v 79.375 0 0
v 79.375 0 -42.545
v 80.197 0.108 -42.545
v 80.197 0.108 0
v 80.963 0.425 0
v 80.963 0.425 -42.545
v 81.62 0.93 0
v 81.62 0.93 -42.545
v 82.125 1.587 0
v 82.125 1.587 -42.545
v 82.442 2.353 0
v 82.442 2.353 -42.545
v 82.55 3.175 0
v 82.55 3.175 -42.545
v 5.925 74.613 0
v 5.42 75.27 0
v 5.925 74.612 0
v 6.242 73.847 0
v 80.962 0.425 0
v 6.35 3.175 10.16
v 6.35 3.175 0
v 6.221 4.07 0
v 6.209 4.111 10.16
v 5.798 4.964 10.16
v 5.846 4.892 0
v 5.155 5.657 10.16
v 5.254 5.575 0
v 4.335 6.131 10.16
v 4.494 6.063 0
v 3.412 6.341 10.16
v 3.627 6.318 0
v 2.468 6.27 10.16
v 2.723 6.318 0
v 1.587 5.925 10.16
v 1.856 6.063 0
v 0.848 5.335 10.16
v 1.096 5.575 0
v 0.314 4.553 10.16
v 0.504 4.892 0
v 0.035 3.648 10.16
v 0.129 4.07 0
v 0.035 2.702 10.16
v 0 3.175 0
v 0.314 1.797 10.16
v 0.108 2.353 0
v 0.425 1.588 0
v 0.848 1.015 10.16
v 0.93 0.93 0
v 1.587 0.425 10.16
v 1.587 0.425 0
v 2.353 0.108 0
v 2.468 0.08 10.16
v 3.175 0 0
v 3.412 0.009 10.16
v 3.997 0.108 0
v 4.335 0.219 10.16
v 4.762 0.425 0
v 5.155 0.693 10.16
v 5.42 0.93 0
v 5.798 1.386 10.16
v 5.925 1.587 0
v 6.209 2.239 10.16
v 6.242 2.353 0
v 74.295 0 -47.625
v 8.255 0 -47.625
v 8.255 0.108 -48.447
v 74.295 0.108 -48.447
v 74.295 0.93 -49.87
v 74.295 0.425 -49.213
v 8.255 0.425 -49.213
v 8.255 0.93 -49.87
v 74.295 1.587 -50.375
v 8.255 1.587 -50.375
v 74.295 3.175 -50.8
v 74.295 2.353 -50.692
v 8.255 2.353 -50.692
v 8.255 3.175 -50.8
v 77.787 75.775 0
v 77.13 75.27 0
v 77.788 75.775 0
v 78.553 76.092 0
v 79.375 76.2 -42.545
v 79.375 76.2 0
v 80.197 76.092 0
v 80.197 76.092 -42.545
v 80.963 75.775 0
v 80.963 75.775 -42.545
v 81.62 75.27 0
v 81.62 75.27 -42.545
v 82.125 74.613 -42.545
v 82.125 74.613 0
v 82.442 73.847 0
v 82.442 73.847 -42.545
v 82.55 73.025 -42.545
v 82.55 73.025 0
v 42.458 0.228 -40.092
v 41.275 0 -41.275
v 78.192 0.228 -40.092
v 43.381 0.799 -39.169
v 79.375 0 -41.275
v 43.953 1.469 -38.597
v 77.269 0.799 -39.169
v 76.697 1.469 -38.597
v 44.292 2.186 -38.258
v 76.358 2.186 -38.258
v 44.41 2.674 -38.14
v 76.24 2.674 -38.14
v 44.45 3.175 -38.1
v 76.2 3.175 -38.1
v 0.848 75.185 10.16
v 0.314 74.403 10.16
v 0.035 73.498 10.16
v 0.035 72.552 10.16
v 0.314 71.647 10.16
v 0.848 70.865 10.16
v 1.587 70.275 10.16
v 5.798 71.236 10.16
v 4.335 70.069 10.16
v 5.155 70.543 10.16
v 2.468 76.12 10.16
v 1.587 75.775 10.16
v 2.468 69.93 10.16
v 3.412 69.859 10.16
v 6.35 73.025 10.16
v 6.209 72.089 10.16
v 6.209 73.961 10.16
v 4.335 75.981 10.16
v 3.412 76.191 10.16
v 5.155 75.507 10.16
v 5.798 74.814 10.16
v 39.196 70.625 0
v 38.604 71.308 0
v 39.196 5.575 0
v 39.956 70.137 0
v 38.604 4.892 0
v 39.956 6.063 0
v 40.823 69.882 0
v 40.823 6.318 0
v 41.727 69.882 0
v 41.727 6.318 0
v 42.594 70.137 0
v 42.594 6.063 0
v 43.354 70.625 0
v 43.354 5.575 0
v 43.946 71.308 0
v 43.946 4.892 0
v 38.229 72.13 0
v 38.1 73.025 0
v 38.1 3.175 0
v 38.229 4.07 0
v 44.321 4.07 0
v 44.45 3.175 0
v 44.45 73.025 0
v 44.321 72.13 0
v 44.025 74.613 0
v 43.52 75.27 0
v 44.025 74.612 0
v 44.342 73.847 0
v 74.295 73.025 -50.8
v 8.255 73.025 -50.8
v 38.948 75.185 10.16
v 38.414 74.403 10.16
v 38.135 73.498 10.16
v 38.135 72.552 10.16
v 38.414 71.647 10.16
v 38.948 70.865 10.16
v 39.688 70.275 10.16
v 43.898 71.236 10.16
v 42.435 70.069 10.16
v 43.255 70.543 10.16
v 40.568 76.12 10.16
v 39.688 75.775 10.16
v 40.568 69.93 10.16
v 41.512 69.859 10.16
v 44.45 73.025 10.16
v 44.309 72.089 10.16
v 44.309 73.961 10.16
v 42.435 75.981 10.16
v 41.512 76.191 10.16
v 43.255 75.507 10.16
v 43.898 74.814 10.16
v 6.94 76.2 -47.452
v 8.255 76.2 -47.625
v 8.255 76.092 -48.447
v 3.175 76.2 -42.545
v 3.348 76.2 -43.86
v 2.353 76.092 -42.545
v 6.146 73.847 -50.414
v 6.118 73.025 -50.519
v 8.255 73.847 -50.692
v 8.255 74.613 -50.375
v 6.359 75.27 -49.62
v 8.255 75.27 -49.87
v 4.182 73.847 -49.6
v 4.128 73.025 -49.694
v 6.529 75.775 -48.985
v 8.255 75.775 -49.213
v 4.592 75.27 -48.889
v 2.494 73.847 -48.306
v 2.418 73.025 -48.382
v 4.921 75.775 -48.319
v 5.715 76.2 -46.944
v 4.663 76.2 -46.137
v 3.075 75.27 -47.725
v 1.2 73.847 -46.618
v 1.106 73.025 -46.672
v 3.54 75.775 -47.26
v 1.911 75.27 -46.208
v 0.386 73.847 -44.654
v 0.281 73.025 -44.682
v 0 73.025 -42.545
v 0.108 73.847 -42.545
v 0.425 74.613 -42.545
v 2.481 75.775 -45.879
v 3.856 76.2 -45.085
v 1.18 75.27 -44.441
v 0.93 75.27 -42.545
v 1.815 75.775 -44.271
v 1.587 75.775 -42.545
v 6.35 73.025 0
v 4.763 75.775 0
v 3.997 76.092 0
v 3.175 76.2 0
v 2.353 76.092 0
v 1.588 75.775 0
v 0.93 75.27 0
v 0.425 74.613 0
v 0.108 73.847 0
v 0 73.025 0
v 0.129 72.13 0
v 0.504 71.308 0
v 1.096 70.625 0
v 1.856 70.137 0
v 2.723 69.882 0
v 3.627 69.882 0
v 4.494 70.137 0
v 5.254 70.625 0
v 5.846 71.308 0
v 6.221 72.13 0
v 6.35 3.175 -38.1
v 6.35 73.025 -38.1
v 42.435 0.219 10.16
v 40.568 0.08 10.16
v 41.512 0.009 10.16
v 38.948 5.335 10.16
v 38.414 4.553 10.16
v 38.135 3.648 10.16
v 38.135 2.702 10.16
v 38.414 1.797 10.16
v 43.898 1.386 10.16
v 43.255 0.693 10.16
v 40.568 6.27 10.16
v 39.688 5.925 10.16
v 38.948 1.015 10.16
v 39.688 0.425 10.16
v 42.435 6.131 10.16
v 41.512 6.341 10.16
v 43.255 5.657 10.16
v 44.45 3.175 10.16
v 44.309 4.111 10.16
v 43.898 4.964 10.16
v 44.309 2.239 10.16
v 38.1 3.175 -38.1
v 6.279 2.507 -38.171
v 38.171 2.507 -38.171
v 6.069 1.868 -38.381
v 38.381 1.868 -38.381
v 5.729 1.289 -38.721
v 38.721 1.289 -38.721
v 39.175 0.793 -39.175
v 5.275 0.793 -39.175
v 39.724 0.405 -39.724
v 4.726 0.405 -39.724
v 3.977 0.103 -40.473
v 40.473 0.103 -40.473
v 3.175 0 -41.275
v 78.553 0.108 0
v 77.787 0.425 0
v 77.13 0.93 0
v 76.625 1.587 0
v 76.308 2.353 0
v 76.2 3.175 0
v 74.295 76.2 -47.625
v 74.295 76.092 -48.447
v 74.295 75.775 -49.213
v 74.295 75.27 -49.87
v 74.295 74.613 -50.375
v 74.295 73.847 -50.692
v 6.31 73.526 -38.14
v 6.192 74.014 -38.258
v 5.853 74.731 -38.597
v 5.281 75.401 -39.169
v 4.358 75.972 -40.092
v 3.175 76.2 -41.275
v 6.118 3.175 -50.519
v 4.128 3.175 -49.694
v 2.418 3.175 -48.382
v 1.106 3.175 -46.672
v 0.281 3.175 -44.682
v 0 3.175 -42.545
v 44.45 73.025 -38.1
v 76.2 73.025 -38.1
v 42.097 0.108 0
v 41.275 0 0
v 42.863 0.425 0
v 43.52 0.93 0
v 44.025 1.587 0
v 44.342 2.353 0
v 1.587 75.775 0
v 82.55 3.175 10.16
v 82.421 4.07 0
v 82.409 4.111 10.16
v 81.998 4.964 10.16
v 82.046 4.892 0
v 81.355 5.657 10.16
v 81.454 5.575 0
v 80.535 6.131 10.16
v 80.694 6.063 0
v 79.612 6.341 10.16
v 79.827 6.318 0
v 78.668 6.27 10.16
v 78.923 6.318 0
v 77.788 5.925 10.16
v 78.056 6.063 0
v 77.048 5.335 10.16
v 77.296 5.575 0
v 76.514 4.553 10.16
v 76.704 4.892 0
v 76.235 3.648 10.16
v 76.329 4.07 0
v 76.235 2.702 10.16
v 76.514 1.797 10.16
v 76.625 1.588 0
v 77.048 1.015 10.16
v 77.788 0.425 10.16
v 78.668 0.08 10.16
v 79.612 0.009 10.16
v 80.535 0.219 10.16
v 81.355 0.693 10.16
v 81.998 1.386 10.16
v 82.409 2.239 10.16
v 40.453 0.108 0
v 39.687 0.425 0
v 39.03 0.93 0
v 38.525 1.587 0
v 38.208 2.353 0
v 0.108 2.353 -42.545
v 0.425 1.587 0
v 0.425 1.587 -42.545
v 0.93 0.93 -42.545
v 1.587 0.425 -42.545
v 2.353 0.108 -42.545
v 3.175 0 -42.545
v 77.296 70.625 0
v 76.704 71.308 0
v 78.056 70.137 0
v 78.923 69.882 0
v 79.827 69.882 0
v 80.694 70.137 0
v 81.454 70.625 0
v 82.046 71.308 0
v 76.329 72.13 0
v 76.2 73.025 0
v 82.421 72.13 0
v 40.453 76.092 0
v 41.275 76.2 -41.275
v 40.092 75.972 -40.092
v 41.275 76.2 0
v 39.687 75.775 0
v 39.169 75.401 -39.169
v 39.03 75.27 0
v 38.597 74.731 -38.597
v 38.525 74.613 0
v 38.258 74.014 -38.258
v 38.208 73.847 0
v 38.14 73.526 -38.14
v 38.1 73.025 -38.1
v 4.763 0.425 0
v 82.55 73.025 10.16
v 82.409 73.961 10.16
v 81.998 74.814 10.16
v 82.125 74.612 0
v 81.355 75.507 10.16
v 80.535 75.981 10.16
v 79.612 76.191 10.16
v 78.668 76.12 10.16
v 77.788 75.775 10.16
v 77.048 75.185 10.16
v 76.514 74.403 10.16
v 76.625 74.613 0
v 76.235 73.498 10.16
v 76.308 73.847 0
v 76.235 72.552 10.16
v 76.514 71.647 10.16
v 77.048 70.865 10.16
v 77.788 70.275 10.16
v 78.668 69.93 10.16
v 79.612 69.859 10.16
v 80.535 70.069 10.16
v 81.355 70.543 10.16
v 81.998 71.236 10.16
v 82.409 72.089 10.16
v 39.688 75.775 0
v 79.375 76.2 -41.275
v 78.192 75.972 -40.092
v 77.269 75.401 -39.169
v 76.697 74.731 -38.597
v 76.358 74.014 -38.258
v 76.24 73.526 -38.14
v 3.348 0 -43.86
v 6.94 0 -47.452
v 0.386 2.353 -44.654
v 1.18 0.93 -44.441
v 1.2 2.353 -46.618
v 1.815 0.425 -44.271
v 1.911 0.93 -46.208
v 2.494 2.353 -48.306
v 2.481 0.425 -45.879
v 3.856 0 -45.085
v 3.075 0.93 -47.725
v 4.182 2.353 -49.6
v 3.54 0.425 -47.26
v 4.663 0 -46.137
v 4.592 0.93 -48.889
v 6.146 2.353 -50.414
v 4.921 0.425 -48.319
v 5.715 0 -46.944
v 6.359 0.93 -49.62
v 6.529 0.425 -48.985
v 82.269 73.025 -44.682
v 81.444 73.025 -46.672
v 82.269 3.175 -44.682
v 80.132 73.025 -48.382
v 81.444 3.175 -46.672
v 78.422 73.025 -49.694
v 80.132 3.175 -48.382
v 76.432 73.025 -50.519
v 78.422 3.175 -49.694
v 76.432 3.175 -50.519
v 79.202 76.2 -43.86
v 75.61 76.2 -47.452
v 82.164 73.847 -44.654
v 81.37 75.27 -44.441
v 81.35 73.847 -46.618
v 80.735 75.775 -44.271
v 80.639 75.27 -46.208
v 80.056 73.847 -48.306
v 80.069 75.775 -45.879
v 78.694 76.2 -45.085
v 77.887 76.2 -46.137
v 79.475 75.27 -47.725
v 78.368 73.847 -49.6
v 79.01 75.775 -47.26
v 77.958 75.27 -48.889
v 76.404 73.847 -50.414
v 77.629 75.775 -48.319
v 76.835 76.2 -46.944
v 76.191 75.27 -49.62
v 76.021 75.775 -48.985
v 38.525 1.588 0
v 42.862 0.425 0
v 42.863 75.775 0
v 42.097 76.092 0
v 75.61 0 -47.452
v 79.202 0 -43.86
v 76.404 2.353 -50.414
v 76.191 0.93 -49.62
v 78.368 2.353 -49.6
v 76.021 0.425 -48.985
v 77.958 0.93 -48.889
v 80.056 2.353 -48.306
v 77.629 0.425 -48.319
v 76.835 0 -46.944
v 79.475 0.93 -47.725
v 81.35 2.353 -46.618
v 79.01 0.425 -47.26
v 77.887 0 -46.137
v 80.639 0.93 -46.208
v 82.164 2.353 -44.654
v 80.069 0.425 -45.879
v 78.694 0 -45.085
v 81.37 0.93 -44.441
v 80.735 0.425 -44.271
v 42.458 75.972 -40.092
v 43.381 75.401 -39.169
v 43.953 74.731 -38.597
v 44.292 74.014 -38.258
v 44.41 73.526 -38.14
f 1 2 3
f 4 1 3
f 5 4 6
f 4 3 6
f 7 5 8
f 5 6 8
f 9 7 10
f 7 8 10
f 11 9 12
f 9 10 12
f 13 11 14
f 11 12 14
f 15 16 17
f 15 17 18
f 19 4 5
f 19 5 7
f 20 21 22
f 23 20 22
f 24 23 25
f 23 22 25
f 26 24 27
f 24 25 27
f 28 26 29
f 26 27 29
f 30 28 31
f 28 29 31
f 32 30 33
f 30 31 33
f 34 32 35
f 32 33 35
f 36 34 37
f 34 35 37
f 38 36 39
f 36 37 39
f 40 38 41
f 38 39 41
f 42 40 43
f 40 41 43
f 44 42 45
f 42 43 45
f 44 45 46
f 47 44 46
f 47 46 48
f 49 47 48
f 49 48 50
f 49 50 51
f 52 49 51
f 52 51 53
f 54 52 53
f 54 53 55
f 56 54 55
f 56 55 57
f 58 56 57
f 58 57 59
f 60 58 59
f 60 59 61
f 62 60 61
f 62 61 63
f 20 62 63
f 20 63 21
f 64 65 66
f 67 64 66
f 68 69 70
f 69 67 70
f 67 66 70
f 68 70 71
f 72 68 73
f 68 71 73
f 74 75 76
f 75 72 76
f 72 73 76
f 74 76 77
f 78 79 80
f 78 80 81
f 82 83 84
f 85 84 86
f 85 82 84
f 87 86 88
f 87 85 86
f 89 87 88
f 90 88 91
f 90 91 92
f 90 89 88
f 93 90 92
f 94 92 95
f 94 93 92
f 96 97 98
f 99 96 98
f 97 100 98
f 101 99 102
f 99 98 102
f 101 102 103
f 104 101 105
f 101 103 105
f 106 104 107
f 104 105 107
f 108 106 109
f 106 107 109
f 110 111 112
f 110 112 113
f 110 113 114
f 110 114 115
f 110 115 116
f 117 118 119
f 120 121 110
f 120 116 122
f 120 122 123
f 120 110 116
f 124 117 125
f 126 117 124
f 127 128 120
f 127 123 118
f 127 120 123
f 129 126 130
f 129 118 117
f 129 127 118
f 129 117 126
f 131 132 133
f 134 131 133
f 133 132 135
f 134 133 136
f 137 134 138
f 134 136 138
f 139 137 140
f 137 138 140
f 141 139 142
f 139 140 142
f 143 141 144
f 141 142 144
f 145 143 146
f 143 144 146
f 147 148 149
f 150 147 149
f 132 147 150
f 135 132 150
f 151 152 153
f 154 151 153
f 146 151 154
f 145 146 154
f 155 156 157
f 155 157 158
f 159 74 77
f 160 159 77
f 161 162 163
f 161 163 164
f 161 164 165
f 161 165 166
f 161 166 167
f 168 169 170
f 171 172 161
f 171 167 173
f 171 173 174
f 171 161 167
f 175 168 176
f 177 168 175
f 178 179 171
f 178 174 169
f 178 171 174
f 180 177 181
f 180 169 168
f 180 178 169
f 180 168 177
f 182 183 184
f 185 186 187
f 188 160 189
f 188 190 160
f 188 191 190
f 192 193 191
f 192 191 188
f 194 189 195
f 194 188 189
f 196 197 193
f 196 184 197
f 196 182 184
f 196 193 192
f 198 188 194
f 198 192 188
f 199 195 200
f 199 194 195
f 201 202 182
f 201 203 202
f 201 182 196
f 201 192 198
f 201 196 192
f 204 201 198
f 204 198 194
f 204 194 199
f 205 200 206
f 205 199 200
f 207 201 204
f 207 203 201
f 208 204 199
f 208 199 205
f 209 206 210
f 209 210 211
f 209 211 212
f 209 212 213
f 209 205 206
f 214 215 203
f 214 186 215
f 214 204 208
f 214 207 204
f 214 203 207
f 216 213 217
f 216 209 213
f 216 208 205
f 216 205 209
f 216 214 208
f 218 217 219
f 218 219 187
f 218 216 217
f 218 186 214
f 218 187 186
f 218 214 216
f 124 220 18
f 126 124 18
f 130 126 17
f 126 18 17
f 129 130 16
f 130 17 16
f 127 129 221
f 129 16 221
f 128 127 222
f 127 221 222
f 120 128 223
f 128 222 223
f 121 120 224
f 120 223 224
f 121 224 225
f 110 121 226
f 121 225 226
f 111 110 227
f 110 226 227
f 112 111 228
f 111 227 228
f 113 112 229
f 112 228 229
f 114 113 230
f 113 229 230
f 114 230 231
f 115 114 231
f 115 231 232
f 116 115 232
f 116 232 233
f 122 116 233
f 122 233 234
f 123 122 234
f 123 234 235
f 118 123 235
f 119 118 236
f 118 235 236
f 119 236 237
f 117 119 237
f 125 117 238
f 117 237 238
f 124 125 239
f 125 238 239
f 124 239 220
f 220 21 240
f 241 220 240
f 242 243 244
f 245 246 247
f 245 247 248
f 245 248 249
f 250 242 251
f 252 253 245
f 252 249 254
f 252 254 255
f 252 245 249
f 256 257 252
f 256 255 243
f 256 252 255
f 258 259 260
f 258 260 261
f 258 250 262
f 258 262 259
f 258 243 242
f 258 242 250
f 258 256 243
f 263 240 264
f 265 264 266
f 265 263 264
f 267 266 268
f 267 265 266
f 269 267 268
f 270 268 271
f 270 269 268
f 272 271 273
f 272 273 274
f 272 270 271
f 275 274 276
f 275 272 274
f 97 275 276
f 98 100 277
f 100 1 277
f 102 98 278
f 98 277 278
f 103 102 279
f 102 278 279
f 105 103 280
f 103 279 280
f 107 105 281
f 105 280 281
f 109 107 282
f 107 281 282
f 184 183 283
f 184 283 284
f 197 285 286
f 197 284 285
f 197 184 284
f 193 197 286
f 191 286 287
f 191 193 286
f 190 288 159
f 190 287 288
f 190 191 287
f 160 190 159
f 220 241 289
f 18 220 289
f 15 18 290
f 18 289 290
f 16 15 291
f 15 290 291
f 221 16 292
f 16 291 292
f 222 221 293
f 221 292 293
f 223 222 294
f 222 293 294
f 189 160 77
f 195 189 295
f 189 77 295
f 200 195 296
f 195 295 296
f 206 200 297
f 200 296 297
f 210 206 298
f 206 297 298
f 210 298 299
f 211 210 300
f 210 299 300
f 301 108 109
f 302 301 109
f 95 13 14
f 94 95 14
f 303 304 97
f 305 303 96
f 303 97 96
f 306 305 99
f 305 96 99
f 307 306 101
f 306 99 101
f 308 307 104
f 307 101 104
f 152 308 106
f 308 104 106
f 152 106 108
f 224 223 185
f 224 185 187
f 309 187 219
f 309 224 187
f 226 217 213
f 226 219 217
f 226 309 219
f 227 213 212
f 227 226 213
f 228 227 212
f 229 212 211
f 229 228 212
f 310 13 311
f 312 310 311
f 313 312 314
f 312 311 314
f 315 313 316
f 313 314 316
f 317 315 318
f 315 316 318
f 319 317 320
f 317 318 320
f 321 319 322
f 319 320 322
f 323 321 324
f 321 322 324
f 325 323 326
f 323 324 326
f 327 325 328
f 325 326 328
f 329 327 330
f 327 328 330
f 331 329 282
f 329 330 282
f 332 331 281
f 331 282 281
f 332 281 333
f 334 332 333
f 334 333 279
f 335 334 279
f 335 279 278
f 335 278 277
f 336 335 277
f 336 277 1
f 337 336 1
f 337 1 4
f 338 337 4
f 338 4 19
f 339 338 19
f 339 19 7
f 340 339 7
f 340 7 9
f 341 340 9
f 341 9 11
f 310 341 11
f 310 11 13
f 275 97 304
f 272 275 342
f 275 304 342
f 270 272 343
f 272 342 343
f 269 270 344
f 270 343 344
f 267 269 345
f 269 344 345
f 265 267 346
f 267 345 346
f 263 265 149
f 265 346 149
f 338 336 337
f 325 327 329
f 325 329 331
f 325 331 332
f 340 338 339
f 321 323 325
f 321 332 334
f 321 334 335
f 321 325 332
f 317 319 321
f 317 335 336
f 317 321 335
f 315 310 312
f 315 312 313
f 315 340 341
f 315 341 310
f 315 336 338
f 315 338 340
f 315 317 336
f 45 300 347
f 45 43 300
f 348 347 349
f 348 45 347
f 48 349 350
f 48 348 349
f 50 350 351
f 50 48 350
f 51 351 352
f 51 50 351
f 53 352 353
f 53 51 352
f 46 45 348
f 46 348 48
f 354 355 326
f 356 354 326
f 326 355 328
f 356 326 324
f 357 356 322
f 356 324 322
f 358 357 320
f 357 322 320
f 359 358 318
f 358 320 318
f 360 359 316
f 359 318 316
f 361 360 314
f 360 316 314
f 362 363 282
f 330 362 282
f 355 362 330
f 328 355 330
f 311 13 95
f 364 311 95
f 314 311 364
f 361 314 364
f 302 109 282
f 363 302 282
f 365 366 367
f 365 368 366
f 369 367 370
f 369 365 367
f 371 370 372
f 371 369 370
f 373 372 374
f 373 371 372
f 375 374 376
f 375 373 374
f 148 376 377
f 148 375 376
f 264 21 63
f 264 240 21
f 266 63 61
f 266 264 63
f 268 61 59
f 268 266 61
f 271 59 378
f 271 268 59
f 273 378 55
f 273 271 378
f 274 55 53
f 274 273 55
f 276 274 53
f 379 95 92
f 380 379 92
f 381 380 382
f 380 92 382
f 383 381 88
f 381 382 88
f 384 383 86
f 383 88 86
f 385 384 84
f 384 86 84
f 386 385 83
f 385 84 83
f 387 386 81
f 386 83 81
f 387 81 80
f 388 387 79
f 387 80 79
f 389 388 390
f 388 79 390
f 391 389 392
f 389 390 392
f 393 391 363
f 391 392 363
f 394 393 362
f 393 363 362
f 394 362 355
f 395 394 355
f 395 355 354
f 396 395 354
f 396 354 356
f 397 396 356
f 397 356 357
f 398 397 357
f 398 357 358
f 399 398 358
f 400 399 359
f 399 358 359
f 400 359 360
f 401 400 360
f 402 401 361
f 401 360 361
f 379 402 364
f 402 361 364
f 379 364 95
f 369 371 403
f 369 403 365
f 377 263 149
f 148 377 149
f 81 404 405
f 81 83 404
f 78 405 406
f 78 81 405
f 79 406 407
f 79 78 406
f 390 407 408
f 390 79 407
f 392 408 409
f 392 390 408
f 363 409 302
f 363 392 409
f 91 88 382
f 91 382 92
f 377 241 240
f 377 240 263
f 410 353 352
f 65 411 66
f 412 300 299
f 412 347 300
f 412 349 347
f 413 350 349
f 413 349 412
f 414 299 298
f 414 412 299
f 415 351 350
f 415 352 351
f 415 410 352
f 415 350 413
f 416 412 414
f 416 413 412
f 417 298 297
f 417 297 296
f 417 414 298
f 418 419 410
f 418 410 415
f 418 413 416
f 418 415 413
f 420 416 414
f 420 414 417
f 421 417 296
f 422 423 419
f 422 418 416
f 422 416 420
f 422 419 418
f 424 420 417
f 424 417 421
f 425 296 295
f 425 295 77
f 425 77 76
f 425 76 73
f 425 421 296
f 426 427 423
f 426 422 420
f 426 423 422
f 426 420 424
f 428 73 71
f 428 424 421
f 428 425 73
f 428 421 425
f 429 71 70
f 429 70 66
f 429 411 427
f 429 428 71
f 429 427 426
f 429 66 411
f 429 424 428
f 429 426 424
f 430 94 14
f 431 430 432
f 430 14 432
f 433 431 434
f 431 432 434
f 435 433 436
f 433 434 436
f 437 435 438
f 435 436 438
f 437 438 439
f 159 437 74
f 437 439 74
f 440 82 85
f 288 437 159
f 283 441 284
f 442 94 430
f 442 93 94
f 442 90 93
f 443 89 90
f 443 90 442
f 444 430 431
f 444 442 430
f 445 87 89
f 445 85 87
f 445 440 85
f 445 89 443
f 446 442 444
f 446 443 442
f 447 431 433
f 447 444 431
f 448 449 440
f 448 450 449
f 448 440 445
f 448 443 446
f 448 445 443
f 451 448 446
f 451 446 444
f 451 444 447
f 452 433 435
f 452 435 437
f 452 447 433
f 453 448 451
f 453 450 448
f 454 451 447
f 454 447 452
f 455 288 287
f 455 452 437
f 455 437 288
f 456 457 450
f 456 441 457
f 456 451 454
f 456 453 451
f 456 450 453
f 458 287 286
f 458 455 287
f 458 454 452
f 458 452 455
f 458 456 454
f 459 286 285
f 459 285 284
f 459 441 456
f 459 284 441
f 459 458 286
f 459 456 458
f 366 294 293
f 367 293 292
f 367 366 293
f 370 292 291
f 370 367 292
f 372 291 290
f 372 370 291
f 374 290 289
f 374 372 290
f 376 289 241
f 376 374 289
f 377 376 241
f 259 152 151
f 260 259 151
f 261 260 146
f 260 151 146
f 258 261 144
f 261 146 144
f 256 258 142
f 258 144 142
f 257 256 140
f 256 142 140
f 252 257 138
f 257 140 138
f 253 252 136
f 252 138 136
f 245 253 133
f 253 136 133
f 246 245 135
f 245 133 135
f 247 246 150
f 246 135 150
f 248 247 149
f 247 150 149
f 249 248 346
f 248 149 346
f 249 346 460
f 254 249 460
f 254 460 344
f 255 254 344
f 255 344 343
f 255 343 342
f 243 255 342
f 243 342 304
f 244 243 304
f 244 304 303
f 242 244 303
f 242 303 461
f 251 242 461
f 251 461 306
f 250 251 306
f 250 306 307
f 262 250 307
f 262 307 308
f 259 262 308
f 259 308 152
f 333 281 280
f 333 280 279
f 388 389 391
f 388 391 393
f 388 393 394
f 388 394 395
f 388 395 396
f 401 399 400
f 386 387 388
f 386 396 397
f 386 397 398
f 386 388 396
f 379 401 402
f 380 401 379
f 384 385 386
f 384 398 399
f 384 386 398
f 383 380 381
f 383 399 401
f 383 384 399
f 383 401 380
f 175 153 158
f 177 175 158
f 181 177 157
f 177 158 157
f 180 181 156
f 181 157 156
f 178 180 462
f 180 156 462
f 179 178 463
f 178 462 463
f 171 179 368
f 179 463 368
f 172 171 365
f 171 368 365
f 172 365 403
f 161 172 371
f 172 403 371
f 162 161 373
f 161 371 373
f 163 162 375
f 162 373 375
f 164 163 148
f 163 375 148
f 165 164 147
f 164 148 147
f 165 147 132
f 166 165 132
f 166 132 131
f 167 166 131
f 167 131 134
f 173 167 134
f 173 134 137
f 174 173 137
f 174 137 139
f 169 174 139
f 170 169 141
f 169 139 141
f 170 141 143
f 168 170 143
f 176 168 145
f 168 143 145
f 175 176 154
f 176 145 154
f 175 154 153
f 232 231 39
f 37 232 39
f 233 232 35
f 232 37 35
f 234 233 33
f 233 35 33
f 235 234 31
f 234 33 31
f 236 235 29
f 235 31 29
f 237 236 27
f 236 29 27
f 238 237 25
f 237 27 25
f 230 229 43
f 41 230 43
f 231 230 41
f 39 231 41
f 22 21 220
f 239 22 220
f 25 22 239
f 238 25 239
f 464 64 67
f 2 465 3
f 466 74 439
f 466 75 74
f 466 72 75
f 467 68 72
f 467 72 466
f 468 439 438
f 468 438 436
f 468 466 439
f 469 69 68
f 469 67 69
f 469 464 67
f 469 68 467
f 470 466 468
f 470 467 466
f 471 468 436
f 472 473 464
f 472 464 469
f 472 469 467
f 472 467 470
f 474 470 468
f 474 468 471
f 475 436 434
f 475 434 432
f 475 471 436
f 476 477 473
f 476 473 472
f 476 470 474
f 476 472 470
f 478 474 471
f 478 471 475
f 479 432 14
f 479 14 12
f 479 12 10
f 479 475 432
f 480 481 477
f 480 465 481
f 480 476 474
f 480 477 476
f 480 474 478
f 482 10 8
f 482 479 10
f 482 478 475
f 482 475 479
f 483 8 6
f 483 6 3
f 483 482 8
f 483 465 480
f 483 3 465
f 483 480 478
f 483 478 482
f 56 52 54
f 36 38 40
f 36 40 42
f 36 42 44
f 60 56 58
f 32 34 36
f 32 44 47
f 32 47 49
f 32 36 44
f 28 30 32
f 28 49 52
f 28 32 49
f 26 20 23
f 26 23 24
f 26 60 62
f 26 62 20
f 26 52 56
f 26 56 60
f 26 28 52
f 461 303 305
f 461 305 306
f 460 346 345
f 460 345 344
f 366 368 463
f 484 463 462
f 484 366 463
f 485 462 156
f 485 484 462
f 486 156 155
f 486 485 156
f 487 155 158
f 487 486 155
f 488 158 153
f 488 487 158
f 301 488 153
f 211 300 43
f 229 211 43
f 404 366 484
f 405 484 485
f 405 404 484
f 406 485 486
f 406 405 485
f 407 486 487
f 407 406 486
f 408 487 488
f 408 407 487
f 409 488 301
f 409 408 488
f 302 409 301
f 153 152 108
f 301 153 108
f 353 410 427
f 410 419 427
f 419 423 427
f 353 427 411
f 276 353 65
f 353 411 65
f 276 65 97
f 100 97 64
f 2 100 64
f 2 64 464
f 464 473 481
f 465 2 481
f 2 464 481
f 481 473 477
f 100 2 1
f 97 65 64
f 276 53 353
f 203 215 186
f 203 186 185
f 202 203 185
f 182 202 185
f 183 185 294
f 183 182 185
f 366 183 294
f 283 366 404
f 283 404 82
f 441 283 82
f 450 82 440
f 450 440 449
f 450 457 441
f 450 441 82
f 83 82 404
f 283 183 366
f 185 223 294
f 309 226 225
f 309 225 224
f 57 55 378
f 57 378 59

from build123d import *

# Parameters (mm, degrees)
BOSS_EXTRUDE1_DEPTH = 76.2
SKETCH3_R           = 3.175
BOSS_EXTRUDE3_DEPTH = 10.16
FILLET2_R           = 3.175
FILLET3_R           = 8.255


# Some blends are built 0.0001 mm under size
with BuildPart() as part:
    # Sketch1 → Boss-Extrude1 (new body)
    with BuildSketch(Plane(origin=(0, 0, 0), x_dir=(1, 0, 0), z_dir=(0, 1, 0))):
        Polygon((44.45, 38.1), (76.2, 38.1), (76.2, 0), (82.55, 0), (82.55, 38.1), (82.55, 50.8), (0, 50.8), (0, 38.1), (0, 0), (6.35, 0), (6.35, 38.1), (38.1, 38.1), (38.1, 0), (44.45, 0), align=None)
    extrude(amount=BOSS_EXTRUDE1_DEPTH)

    # Sketch3 → Boss-Extrude3 (add)
    with BuildSketch(Plane.XY):
        with Locations((3.175, 73.025)):
            Circle(SKETCH3_R)
        with Locations((3.175, 3.175)):
            Circle(SKETCH3_R)
        with Locations((41.275, 3.175)):
            Circle(SKETCH3_R)
        with Locations((79.375, 3.175)):
            Circle(SKETCH3_R)
        with Locations((41.275, 73.025)):
            Circle(SKETCH3_R)
        with Locations((79.375, 73.025)):
            Circle(SKETCH3_R)
    extrude(amount=BOSS_EXTRUDE3_DEPTH)

    # Fillet2
    fillet2_edges = [part.edges().sort_by_distance(p)[0] for p in [
        (6.35, 0, -19.05),
        (22.225, 0, -38.1),
        (38.1, 0, -19.05),
        (44.45, 0, -19.05),
        (60.325, 0, -38.1),
        (76.2, 0, -19.05),
        (82.55, 0, -25.4),
        (41.275, 0, -50.8),
        (0, 0, -25.4),
        (41.275, 76.2, -50.8),
        (82.55, 76.2, -25.4),
        (76.2, 76.2, -19.05),
        (60.325, 76.2, -38.1),
        (44.45, 76.2, -19.05),
        (38.1, 76.2, -19.05),
        (22.225, 76.2, -38.1),
        (6.35, 76.2, -19.05),
        (0, 76.2, -25.4),
    ]]
    fillet(fillet2_edges, radius=FILLET2_R - 0.0001)  # a hair under: the kernel refuses the full size

    # Fillet3
    # the kernel refuses this fillet: 8.255 mm, written as the material it takes off along each edge
    with BuildSketch(Plane(origin=(74.295, 0, -42.545), x_dir=(0, 0, -1), z_dir=(-1, 0, 0))) as fillet3_piece_1:
        with BuildLine():
            CenterArc((5.0801, -3.1749), 3.1749, 0, 90)
            Line((8.255, -3.1749), (8.255, 0))
            Line((8.255, 0), (5.0801, 0))
        make_face()
    revolve(axis=Axis((74.295, 0, -42.545), (0, -1, 0)), revolution_arc=90, mode=Mode.SUBTRACT)
    with BuildSketch(Plane(origin=(8.255, 0, -42.545), x_dir=(-1, 0, 0), z_dir=(0, 0, 1))) as fillet3_piece_2:
        with BuildLine():
            CenterArc((5.0801, -3.1749), 3.1749, 0, 90)
            Line((8.255, -3.1749), (8.255, 0))
            Line((8.255, 0), (5.0801, 0))
        make_face()
    revolve(axis=Axis((8.255, 0, -42.545), (0, -1, 0)), revolution_arc=90, mode=Mode.SUBTRACT)
    with BuildSketch(Plane(origin=(74.295, 76.2, -42.545), x_dir=(1, 0, 0), z_dir=(0, 0, 1))) as fillet3_piece_3:
        with BuildLine():
            CenterArc((5.0801, -3.1749), 3.1749, 0, 90)
            Line((8.255, -3.1749), (8.255, 0))
            Line((8.255, 0), (5.0801, 0))
        make_face()
    revolve(axis=Axis((74.295, 76.2, -42.545), (0, 1, 0)), revolution_arc=90, mode=Mode.SUBTRACT)
    with BuildSketch(Plane(origin=(8.255, 76.2, -42.545), x_dir=(0, 0, -1), z_dir=(1, 0, 0))) as fillet3_piece_4:
        with BuildLine():
            CenterArc((5.0801, -3.1749), 3.1749, 0, 90)
            Line((8.255, -3.1749), (8.255, 0))
            Line((8.255, 0), (5.0801, 0))
        make_face()
    revolve(axis=Axis((8.255, 76.2, -42.545), (0, 1, 0)), revolution_arc=90, mode=Mode.SUBTRACT)
    with BuildSketch(Plane(origin=(0, 0, -50.8), x_dir=(1, 0, 0), z_dir=(0, 1, 0)), Plane(origin=(82.55, 0, -50.8), x_dir=(0, 0, 1), z_dir=(0, 1, 0))) as fillet3_piece_5:
        with BuildLine():
            CenterArc((FILLET3_R, -FILLET3_R), FILLET3_R, 90, 90)
            Line((0, -FILLET3_R), (0, 0))
            Line((0, 0), (FILLET3_R, 0))
        make_face()
    extrude(amount=76.2, mode=Mode.SUBTRACT)


solid = part.part
